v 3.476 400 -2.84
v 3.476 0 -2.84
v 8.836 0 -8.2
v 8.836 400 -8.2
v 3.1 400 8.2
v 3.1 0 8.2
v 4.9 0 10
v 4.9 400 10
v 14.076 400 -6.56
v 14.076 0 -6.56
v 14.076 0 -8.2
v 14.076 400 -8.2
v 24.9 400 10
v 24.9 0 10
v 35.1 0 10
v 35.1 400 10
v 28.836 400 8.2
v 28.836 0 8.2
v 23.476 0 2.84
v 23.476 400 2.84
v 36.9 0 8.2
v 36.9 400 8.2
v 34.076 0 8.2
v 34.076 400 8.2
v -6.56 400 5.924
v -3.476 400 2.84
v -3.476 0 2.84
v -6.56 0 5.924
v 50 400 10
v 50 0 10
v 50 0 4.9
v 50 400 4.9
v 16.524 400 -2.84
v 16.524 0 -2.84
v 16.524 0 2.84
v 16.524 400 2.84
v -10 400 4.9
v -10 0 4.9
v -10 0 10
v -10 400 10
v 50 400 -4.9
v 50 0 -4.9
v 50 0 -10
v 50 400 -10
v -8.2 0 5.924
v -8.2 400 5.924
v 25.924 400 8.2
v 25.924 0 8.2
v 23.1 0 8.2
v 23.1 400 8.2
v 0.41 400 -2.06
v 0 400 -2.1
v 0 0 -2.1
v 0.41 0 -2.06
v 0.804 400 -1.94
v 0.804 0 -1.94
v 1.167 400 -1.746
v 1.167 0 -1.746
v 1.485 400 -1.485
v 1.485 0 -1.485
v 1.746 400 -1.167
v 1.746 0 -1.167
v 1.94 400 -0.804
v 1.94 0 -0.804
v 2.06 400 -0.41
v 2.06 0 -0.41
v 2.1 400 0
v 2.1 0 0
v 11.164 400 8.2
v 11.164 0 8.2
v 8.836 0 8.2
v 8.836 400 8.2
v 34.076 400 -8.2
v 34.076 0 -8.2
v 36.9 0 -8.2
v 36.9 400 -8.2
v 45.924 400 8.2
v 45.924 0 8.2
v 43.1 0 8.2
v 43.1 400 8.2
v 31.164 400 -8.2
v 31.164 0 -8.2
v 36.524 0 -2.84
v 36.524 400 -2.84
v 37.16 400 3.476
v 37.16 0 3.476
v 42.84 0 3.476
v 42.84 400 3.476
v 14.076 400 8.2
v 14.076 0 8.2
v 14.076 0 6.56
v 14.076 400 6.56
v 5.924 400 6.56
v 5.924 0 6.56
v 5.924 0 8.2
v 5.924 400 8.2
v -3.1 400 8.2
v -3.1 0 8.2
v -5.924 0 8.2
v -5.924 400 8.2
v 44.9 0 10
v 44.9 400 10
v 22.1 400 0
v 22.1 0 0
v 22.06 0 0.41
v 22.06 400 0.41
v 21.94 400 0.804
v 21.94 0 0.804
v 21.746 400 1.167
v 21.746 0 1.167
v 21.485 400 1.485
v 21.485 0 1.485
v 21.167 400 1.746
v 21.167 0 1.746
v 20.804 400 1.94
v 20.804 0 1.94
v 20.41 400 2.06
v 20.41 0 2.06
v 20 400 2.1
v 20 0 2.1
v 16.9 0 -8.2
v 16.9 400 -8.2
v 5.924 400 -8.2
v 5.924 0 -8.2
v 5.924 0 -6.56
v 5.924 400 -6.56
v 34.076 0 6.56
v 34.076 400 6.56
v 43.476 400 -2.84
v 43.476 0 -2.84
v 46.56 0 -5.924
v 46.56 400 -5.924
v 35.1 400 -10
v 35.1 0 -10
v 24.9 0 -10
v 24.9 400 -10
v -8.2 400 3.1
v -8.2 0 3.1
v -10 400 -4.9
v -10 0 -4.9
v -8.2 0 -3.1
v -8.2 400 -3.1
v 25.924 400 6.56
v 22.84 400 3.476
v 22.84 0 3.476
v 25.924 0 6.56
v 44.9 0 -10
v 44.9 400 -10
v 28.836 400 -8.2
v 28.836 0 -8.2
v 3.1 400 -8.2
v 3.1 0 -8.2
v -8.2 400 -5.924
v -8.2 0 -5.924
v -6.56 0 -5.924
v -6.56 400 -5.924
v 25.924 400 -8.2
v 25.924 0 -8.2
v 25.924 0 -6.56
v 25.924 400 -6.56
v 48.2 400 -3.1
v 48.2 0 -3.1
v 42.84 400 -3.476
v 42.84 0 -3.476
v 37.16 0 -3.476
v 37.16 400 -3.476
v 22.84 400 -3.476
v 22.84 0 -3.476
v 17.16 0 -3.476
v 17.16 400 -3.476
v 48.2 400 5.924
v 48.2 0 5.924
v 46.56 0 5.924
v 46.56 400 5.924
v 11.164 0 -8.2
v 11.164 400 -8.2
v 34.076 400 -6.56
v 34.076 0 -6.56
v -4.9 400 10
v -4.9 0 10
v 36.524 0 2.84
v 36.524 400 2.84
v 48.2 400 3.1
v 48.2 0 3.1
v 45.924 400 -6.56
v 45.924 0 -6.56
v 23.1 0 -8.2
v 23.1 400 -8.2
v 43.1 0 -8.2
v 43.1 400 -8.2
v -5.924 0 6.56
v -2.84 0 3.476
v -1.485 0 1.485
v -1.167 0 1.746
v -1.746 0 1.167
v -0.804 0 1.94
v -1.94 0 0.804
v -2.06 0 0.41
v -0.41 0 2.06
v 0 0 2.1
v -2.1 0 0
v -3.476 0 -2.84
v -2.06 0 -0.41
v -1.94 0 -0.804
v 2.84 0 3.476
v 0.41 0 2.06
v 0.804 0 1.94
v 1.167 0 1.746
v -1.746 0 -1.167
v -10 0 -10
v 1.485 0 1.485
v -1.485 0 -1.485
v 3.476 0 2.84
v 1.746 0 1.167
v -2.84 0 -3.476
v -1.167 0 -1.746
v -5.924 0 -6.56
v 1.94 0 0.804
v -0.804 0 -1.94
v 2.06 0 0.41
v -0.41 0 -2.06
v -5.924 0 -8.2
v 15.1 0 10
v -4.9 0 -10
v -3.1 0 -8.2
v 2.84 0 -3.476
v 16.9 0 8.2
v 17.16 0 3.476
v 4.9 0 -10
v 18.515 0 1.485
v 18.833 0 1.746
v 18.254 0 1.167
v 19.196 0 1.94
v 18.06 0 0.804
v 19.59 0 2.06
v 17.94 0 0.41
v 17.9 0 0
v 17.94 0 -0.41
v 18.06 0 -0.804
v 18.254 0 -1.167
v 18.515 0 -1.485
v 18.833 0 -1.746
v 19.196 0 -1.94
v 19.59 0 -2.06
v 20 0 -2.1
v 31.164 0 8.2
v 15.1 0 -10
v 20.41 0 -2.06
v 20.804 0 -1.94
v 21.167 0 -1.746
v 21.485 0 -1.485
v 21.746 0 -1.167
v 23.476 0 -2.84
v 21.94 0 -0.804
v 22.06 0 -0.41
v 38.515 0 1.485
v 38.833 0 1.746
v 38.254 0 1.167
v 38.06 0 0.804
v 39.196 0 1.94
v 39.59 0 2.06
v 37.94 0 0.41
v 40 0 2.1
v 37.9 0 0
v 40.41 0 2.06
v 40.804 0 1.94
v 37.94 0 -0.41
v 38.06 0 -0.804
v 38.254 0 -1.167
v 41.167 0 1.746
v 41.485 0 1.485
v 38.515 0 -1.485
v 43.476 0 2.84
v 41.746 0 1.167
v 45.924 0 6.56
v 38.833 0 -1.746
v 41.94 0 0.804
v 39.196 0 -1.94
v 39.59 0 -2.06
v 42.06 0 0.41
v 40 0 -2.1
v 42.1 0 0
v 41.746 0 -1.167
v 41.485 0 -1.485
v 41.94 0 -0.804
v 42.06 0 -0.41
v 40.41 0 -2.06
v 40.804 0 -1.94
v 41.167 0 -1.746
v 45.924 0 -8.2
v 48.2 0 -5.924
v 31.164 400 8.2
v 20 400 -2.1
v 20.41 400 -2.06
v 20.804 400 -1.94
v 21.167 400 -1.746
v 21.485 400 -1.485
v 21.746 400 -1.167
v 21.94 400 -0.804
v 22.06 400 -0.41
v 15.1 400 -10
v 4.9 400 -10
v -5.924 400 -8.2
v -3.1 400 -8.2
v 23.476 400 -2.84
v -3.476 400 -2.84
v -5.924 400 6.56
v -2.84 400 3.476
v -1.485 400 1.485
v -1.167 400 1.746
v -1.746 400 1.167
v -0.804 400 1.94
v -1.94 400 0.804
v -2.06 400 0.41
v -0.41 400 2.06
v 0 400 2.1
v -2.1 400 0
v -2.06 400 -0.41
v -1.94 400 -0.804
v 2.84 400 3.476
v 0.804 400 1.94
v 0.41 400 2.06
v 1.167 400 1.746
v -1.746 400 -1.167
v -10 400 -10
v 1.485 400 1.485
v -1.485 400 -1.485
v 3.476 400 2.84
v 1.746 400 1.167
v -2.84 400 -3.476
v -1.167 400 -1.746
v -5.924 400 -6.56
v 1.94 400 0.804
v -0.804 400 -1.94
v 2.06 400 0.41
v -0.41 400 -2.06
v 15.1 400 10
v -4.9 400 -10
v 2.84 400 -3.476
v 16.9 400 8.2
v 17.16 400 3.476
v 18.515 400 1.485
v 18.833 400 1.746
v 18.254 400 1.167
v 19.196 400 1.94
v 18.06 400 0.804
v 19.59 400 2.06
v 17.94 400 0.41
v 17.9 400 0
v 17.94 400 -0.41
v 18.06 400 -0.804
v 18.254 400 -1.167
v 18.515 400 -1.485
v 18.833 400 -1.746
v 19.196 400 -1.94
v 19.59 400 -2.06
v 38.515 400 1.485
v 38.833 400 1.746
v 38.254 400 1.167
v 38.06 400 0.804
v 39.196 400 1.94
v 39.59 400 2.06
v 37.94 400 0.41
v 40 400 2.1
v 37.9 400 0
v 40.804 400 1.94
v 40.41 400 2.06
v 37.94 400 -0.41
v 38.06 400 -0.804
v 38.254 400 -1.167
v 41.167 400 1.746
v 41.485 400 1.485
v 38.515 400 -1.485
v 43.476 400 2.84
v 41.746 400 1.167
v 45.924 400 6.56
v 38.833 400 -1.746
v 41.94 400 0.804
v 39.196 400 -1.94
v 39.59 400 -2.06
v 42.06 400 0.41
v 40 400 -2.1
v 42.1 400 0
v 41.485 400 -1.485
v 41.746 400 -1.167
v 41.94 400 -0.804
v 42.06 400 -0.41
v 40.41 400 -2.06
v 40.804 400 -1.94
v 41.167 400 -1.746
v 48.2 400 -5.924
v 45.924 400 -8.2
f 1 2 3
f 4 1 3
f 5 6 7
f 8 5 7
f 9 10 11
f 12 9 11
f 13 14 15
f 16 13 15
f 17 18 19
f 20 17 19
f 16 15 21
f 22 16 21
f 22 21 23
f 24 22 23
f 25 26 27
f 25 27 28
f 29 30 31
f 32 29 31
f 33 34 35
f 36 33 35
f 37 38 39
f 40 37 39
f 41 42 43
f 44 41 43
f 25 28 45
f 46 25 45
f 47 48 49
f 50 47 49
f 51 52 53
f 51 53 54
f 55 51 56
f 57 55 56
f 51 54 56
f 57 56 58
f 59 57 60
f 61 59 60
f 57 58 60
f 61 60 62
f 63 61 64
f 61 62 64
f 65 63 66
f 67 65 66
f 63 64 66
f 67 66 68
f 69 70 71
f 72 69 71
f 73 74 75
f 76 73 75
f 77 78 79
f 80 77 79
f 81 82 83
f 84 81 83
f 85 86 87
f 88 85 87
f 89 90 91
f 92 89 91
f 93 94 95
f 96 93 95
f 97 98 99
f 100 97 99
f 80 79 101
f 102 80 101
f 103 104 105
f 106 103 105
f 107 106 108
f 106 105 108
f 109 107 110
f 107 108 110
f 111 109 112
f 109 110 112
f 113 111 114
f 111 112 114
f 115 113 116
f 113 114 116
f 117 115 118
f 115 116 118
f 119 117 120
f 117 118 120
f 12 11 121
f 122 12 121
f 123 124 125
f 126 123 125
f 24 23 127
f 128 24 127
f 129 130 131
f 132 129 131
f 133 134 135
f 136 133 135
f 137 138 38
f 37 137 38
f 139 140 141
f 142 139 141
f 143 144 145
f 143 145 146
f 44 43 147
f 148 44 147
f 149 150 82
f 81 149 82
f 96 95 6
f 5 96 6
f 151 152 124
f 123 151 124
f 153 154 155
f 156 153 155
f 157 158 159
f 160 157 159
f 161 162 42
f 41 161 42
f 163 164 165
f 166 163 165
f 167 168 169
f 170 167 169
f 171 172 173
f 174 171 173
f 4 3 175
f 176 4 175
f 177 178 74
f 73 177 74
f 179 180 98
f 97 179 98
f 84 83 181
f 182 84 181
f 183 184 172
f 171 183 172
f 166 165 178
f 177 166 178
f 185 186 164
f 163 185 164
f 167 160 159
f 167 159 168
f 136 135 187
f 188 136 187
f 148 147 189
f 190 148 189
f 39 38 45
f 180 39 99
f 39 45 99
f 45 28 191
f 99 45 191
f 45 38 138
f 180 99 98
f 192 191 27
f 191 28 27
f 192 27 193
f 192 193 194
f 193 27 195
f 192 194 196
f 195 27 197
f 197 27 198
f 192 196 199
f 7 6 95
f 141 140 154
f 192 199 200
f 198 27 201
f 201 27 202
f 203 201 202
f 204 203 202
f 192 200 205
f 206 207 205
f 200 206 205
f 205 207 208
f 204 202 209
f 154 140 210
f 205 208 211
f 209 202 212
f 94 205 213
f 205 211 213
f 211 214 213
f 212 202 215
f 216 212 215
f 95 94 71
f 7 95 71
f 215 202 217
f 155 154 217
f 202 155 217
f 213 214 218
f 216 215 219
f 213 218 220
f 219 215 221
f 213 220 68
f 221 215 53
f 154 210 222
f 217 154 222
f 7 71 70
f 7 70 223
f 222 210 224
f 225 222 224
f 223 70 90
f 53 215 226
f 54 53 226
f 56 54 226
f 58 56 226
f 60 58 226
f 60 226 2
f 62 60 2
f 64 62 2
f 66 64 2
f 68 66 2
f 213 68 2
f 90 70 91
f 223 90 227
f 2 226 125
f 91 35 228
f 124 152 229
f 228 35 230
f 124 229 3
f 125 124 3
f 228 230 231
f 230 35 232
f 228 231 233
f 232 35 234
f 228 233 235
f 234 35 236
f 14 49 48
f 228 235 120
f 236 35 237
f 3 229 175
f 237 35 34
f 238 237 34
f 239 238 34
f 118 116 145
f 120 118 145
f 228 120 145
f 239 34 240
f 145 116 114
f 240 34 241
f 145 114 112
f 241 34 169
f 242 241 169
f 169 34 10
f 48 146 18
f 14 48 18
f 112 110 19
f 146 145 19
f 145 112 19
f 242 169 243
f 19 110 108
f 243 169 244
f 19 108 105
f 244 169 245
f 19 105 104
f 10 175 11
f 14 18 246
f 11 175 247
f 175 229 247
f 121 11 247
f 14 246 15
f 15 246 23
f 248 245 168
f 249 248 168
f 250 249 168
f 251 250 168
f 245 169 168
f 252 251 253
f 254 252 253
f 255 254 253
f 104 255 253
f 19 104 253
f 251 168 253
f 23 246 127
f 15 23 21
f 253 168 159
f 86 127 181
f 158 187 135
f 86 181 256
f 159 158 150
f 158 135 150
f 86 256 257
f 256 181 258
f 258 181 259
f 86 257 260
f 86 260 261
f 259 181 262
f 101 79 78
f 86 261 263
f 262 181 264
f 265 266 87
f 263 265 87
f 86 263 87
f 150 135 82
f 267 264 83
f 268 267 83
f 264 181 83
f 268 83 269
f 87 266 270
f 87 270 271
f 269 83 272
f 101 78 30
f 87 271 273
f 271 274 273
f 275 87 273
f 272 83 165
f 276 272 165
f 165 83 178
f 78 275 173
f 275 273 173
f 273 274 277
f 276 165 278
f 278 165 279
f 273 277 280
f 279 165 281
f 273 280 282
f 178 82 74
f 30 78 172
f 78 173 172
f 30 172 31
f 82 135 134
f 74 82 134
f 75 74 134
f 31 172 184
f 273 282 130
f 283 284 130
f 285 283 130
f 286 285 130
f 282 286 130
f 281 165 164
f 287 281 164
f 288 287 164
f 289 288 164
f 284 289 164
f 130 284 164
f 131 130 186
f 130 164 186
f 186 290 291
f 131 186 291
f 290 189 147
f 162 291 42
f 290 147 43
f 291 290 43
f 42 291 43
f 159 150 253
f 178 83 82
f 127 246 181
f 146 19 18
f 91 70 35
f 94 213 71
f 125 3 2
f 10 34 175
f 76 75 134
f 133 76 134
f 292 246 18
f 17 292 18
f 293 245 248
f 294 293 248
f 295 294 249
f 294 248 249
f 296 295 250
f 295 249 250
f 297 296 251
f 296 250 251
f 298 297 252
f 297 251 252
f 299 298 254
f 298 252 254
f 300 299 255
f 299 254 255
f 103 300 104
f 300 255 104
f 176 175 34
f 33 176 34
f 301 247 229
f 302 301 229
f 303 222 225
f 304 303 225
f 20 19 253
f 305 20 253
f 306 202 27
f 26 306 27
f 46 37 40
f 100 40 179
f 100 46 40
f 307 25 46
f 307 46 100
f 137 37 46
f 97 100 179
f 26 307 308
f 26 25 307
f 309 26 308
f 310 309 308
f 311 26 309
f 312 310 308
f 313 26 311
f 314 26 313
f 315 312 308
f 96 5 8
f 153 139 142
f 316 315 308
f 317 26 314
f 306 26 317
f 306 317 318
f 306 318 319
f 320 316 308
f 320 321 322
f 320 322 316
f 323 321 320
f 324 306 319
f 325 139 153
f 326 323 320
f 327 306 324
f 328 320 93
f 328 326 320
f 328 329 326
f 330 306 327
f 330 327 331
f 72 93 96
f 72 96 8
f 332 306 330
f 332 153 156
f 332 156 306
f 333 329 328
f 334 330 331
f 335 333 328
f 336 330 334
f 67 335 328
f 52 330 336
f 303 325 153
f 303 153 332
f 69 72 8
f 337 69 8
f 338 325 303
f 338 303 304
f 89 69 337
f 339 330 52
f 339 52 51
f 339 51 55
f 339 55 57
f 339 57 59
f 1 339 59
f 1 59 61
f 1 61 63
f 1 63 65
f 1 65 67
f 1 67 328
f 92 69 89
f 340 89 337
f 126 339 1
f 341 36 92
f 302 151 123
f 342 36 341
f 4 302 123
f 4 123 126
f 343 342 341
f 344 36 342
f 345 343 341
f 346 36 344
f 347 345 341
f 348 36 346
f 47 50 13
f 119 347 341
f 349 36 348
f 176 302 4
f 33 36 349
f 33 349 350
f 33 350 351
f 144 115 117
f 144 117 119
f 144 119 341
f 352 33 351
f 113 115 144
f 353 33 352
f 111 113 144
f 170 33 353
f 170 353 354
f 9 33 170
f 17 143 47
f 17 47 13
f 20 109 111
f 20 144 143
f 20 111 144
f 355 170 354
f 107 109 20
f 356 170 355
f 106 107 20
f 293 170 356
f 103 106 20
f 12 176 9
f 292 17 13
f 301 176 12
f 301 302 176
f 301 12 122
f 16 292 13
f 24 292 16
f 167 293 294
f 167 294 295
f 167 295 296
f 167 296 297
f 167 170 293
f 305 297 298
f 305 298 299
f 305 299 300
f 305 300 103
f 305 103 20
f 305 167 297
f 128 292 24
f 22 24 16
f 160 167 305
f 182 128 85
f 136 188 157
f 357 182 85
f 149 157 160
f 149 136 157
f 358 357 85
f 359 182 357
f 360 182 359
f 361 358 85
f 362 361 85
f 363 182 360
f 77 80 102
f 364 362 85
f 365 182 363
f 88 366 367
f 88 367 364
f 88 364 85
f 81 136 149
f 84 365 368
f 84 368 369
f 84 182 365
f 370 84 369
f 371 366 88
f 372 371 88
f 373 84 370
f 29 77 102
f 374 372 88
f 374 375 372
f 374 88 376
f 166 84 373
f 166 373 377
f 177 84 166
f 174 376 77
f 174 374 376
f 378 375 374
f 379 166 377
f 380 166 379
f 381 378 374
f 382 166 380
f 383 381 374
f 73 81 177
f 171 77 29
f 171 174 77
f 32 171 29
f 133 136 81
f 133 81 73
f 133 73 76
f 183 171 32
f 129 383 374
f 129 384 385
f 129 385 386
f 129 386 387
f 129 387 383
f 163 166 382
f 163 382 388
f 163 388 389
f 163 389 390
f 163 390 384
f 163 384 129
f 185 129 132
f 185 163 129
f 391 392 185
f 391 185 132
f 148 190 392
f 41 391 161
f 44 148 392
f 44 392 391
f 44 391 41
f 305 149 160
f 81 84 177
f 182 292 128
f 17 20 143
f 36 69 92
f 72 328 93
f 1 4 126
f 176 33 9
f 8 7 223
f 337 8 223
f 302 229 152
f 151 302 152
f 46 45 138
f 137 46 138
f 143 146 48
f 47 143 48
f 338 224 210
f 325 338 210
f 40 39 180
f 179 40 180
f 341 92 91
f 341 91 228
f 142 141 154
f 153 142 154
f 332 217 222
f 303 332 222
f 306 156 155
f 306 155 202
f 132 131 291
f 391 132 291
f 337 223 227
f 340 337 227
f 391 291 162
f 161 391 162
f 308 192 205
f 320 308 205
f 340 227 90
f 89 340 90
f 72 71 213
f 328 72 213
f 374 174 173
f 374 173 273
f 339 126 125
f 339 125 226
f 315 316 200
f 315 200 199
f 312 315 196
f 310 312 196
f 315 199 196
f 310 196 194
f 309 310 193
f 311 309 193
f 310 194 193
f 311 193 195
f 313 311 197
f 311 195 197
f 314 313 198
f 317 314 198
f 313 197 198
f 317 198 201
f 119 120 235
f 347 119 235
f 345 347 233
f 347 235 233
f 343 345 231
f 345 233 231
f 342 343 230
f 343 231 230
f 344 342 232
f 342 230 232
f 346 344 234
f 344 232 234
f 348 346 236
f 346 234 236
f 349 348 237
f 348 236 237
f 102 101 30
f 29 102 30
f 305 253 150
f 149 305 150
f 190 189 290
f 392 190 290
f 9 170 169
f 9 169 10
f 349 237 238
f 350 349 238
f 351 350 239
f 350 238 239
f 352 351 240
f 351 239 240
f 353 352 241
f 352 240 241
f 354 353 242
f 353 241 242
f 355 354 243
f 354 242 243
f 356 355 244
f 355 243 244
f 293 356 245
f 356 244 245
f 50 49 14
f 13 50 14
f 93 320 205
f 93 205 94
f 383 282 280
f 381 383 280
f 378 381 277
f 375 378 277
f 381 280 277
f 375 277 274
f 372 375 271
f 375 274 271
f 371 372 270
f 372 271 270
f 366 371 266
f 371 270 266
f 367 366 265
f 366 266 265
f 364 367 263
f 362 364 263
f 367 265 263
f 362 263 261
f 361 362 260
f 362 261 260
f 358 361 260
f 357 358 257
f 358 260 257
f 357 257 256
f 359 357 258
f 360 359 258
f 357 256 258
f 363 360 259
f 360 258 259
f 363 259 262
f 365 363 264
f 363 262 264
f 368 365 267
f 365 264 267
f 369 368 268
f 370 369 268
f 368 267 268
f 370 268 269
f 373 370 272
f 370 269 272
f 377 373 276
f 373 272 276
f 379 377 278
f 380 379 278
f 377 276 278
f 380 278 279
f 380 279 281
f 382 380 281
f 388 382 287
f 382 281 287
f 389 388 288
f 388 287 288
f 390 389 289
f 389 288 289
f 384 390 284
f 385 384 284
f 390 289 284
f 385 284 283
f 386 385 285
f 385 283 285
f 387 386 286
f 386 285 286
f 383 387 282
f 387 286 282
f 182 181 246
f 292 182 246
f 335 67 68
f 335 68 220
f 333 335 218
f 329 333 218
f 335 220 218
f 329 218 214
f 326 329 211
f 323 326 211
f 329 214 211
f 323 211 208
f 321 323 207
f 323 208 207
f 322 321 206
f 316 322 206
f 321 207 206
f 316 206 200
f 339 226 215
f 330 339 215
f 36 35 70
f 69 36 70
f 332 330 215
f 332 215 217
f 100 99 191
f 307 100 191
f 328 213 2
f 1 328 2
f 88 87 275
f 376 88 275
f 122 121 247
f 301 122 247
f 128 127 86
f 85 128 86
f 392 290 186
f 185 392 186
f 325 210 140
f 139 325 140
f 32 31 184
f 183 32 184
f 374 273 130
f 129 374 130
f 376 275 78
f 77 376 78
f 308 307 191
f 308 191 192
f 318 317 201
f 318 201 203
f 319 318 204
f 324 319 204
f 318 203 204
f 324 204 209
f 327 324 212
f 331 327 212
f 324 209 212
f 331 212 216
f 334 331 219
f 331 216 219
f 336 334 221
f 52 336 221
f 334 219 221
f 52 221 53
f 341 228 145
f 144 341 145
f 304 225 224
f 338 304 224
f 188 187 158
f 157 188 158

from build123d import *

# Parameters (mm, degrees)
EXTRUDE_1_DEPTH = 400


with BuildPart() as part:
    # 草图1 → 凸台-拉伸1 (new body)
    with BuildSketch(Plane(origin=(0, 0, 0), x_dir=(1, 0, 0), z_dir=(0, 1, 0))):
        with BuildLine():
            Line((-3.476396103, 2.84), (-3.476396103, 0))
            Line((-3.476396103, 0), (-2.1, 0))
            ThreePointArc((-2.1, 0), (-1.48492424, 1.48492424), (0, 2.1))
            Line((0, 2.1), (0, 3.476396103))
            Line((0, 3.476396103), (-2.84, 3.476396103))
            Line((-2.84, 3.476396103), (-5.923603897, 6.56))
            Line((-5.923603897, 6.56), (-5.923603897, 8.2))
            Line((-5.923603897, 8.2), (-3.1, 8.2))
            Line((-3.1, 8.2), (-4.9, 10))
            Line((-4.9, 10), (-10, 10))
            Line((-10, 10), (-10, 4.9))
            Line((-10, 4.9), (-8.2, 3.1))
            Line((-8.2, 3.1), (-8.2, 5.923603897))
            Line((-8.2, 5.923603897), (-6.56, 5.923603897))
            Line((-6.56, 5.923603897), (-3.476396103, 2.84))
        make_face()
        with BuildLine():
            Line((-2.1, 0), (-3.476396103, 0))
            Line((-3.476396103, 0), (-3.476396103, -2.84))
            Line((-3.476396103, -2.84), (-6.56, -5.923603897))
            Line((-6.56, -5.923603897), (-8.2, -5.923603897))
            Line((-8.2, -5.923603897), (-8.2, -3.1))
            Line((-8.2, -3.1), (-10, -4.9))
            Line((-10, -4.9), (-10, -10))
            Line((-10, -10), (-4.9, -10))
            Line((-4.9, -10), (-3.1, -8.2))
            Line((-3.1, -8.2), (-5.923603897, -8.2))
            Line((-5.923603897, -8.2), (-5.923603897, -6.56))
            Line((-5.923603897, -6.56), (-2.84, -3.476396103))
            Line((-2.84, -3.476396103), (0, -3.476396103))
            Line((0, -3.476396103), (0, -2.1))
            ThreePointArc((0, -2.1), (-1.48492424, -1.48492424), (-2.1, 0))
        make_face()
        with BuildLine():
            ThreePointArc((2.1, 0), (1.48492424, -1.48492424), (0, -2.1))
            Line((0, -2.1), (0, -3.476396103))
            Line((0, -3.476396103), (2.84, -3.476396103))
            Line((2.84, -3.476396103), (5.923603897, -6.56))
            Line((5.923603897, -6.56), (5.923603897, -8.2))
            Line((5.923603897, -8.2), (3.1, -8.2))
            Line((3.1, -8.2), (4.9, -10))
            Line((4.9, -10), (15.1, -10))
            Line((15.1, -10), (16.9, -8.2))
            Line((16.9, -8.2), (14.076396103, -8.2))
            Line((14.076396103, -8.2), (14.076396103, -6.56))
            Line((14.076396103, -6.56), (17.16, -3.476396103))
            Line((17.16, -3.476396103), (20, -3.476396103))
            Line((20, -3.476396103), (20, -2.1))
            ThreePointArc((20, -2.1), (18.51507576, -1.48492424), (17.9, 0))
            Line((17.9, 0), (16.523603897, 0))
            Line((16.523603897, 0), (16.523603897, -2.84))
            Line((16.523603897, -2.84), (13.44, -5.923603897))
            Line((13.44, -5.923603897), (11.163603897, -8.2))
            Line((11.163603897, -8.2), (8.836396103, -8.2))
            Line((8.836396103, -8.2), (6.56, -5.923603897))
            Line((6.56, -5.923603897), (3.476396103, -2.84))
            Line((3.476396103, -2.84), (3.476396103, 0))
            Line((3.476396103, 0), (2.1, 0))
        make_face()
        with BuildLine():
            Line((0, 3.476396103), (0, 2.1))
            ThreePointArc((0, 2.1), (1.48492424, 1.48492424), (2.1, 0))
            Line((2.1, 0), (3.476396103, 0))
            Line((3.476396103, 0), (3.476396103, 2.84))
            Line((3.476396103, 2.84), (6.56, 5.923603897))
            Line((6.56, 5.923603897), (8.836396103, 8.2))
            Line((8.836396103, 8.2), (11.163603897, 8.2))
            Line((11.163603897, 8.2), (13.44, 5.923603897))
            Line((13.44, 5.923603897), (16.523603897, 2.84))
            Line((16.523603897, 2.84), (16.523603897, 0))
            Line((16.523603897, 0), (17.9, 0))
            ThreePointArc((17.9, 0), (18.51507576, 1.48492424), (20, 2.1))
            Line((20, 2.1), (20, 3.476396103))
            Line((20, 3.476396103), (17.16, 3.476396103))
            Line((17.16, 3.476396103), (14.076396103, 6.56))
            Line((14.076396103, 6.56), (14.076396103, 8.2))
            Line((14.076396103, 8.2), (16.9, 8.2))
            Line((16.9, 8.2), (15.1, 10))
            Line((15.1, 10), (4.9, 10))
            Line((4.9, 10), (3.1, 8.2))
            Line((3.1, 8.2), (5.923603897, 8.2))
            Line((5.923603897, 8.2), (5.923603897, 6.56))
            Line((5.923603897, 6.56), (2.84, 3.476396103))
            Line((2.84, 3.476396103), (0, 3.476396103))
        make_face()
        with BuildLine():
            Line((20, 3.476396103), (20, 2.1))
            ThreePointArc((20, 2.1), (21.48492424, 1.48492424), (22.1, 0))
            Line((22.1, 0), (23.476396103, 0))
            Line((23.476396103, 0), (23.476396103, 2.84))
            Line((23.476396103, 2.84), (26.56, 5.923603897))
            Line((26.56, 5.923603897), (28.836396103, 8.2))
            Line((28.836396103, 8.2), (31.163603897, 8.2))
            Line((31.163603897, 8.2), (33.44, 5.923603897))
            Line((33.44, 5.923603897), (36.523603897, 2.84))
            Line((36.523603897, 2.84), (36.523603897, 0))
            Line((36.523603897, 0), (37.9, 0))
            ThreePointArc((37.9, 0), (40, 2.1), (42.1, 0))
            Line((42.1, 0), (43.476396103, 0))
            Line((43.476396103, 0), (43.476396103, 2.84))
            Line((43.476396103, 2.84), (46.56, 5.923603897))
            Line((46.56, 5.923603897), (48.2, 5.923603897))
            Line((48.2, 5.923603897), (48.2, 3.1))
            Line((48.2, 3.1), (50, 4.9))
            Line((50, 4.9), (50, 10))
            Line((50, 10), (44.9, 10))
            Line((44.9, 10), (43.1, 8.2))
            Line((43.1, 8.2), (45.923603897, 8.2))
            Line((45.923603897, 8.2), (45.923603897, 6.56))
            Line((45.923603897, 6.56), (42.84, 3.476396103))
            Line((42.84, 3.476396103), (37.16, 3.476396103))
            Line((37.16, 3.476396103), (34.076396103, 6.56))
            Line((34.076396103, 6.56), (34.076396103, 8.2))
            Line((34.076396103, 8.2), (36.9, 8.2))
            Line((36.9, 8.2), (35.1, 10))
            Line((35.1, 10), (24.9, 10))
            Line((24.9, 10), (23.1, 8.2))
            Line((23.1, 8.2), (25.923603897, 8.2))
            Line((25.923603897, 8.2), (25.923603897, 6.56))
            Line((25.923603897, 6.56), (22.84, 3.476396103))
            Line((22.84, 3.476396103), (20, 3.476396103))
        make_face()
        with BuildLine():
            ThreePointArc((22.1, 0), (21.48492424, -1.48492424), (20, -2.1))
            Line((20, -2.1), (20, -3.476396103))
            Line((20, -3.476396103), (22.84, -3.476396103))
            Line((22.84, -3.476396103), (25.923603897, -6.56))
            Line((25.923603897, -6.56), (25.923603897, -8.2))
            Line((25.923603897, -8.2), (23.1, -8.2))
            Line((23.1, -8.2), (24.9, -10))
            Line((24.9, -10), (35.1, -10))
            Line((35.1, -10), (36.9, -8.2))
            Line((36.9, -8.2), (34.076396103, -8.2))
            Line((34.076396103, -8.2), (34.076396103, -6.56))
            Line((34.076396103, -6.56), (37.16, -3.476396103))
            Line((37.16, -3.476396103), (42.84, -3.476396103))
            Line((42.84, -3.476396103), (45.923603897, -6.56))
            Line((45.923603897, -6.56), (45.923603897, -8.2))
            Line((45.923603897, -8.2), (43.1, -8.2))
            Line((43.1, -8.2), (44.9, -10))
            Line((44.9, -10), (50, -10))
            Line((50, -10), (50, -4.9))
            Line((50, -4.9), (48.2, -3.1))
            Line((48.2, -3.1), (48.2, -5.923603897))
            Line((48.2, -5.923603897), (46.56, -5.923603897))
            Line((46.56, -5.923603897), (43.476396103, -2.84))
            Line((43.476396103, -2.84), (43.476396103, 0))
            Line((43.476396103, 0), (42.1, 0))
            ThreePointArc((42.1, 0), (40, -2.1), (37.9, 0))
            Line((37.9, 0), (36.523603897, 0))
            Line((36.523603897, 0), (36.523603897, -2.84))
            Line((36.523603897, -2.84), (33.44, -5.923603897))
            Line((33.44, -5.923603897), (31.163603897, -8.2))
            Line((31.163603897, -8.2), (28.836396103, -8.2))
            Line((28.836396103, -8.2), (26.56, -5.923603897))
            Line((26.56, -5.923603897), (23.476396103, -2.84))
            Line((23.476396103, -2.84), (23.476396103, 0))
            Line((23.476396103, 0), (22.1, 0))
        make_face()
    extrude(amount=EXTRUDE_1_DEPTH)


solid = part.part
